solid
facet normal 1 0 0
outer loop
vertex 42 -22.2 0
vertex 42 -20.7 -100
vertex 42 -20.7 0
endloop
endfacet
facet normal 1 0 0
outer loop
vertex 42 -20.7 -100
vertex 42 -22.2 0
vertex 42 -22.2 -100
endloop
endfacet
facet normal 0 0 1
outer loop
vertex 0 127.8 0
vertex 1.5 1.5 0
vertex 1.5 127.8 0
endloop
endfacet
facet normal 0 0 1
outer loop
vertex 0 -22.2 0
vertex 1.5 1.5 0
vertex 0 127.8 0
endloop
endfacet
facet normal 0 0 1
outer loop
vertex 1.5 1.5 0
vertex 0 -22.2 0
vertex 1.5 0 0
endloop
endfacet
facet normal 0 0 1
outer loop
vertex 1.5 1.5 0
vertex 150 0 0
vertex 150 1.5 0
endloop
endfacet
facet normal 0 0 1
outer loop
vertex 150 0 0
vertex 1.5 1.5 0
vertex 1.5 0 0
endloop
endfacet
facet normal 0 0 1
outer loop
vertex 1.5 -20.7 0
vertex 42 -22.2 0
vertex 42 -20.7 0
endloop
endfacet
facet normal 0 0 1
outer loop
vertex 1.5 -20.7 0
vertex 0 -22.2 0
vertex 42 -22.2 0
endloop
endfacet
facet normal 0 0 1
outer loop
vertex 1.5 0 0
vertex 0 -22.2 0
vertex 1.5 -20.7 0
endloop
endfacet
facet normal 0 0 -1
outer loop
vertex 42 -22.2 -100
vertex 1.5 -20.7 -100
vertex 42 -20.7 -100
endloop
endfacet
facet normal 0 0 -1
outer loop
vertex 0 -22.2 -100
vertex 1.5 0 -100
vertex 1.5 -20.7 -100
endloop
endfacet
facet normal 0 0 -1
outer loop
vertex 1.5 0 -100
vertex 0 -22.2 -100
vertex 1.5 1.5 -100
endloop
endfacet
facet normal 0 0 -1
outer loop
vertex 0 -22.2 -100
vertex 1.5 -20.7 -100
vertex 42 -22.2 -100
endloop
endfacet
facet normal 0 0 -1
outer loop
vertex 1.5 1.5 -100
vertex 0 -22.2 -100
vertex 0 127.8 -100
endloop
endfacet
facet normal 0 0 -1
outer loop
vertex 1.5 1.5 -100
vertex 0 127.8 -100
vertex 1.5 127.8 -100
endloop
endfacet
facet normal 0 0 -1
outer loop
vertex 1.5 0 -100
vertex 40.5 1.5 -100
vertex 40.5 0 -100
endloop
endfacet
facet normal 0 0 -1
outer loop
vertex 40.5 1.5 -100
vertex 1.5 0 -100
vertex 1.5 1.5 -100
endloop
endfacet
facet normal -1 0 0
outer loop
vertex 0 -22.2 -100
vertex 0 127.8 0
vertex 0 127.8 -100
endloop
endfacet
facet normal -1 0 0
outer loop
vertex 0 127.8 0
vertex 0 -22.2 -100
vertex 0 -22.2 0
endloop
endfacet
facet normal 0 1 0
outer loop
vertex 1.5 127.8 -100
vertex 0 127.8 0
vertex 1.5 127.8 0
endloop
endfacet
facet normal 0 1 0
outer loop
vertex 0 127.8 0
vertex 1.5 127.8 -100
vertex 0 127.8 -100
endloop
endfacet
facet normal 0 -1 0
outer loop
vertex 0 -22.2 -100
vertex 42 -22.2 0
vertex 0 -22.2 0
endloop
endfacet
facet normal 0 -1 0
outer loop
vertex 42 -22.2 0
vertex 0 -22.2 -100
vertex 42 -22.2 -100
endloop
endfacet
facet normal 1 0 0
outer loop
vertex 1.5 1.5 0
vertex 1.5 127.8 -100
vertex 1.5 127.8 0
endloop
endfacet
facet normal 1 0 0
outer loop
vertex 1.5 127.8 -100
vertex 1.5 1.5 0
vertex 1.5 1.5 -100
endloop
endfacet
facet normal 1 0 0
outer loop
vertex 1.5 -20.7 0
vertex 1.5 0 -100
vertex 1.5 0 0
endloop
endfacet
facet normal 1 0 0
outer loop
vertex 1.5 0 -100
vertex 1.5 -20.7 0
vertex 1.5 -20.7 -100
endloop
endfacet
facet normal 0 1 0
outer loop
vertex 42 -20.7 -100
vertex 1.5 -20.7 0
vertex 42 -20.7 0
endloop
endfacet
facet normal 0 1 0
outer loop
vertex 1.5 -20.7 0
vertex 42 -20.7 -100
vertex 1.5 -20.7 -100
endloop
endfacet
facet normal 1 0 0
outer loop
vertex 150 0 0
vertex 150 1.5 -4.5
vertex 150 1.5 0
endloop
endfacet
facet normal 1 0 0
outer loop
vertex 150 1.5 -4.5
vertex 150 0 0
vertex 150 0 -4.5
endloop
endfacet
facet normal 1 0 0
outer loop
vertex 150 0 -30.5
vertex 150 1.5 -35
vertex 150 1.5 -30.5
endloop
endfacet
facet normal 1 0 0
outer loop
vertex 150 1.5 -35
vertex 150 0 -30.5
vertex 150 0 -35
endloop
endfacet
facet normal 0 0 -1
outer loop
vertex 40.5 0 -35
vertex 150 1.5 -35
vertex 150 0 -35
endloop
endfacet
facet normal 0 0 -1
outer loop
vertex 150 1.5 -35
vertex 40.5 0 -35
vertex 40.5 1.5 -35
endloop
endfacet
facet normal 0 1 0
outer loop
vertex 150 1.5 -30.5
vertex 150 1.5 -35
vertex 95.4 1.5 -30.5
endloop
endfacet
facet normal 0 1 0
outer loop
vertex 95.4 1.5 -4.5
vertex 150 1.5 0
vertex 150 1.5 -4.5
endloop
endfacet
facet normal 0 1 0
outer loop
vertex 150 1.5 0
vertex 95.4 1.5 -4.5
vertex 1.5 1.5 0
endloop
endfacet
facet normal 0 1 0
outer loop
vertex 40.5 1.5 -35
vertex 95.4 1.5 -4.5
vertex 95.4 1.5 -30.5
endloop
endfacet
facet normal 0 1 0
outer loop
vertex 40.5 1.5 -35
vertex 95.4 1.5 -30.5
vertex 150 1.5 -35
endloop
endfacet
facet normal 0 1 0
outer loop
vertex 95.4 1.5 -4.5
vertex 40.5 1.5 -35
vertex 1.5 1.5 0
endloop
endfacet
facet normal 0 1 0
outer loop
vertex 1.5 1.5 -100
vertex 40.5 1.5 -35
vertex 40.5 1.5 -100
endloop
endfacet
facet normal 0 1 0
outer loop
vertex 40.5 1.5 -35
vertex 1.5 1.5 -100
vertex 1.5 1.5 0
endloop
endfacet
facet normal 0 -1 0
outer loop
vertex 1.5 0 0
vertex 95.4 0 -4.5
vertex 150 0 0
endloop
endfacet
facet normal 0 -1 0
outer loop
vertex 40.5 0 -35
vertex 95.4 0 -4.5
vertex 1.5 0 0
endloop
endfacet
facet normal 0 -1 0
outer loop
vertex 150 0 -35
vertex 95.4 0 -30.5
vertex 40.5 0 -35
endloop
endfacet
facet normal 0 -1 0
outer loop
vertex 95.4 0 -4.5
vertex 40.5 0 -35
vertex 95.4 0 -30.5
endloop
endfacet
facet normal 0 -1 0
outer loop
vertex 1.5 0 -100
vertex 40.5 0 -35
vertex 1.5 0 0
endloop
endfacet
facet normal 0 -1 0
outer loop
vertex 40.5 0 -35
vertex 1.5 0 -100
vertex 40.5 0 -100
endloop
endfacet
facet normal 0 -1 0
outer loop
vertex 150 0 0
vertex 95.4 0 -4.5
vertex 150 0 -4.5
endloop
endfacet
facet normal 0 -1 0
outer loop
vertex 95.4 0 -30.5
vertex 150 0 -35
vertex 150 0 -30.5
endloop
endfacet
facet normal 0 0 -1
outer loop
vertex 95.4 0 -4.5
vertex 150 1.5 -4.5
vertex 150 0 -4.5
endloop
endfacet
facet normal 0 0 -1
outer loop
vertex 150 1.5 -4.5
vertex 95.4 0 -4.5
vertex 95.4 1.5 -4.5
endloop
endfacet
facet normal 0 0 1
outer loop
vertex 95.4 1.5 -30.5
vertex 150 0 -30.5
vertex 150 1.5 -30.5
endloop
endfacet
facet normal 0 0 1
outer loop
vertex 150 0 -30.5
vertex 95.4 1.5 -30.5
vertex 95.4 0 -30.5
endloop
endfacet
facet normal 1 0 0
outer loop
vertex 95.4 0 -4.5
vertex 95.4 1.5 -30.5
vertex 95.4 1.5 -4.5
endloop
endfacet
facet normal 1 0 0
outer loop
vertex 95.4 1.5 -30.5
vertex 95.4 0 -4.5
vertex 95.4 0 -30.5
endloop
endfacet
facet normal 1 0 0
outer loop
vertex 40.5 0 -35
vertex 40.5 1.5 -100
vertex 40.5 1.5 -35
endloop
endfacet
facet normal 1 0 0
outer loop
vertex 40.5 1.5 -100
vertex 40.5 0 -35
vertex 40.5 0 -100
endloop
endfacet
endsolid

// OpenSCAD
use <MCAD/regular_shapes.scad>


t = 1.5;
p_w = 74.2;
eps = 1;

b_w = 20.7;
b_h = 40.5;

bed_to_skirting = 150;
extension_w = 26;
bed_to_skirting_w = extension_w + 6*t;
extension_h = 54.6;

table_w = 100;
table_l = 150;

translate([0, - b_w - t, -table_w])
difference(){
    cube([b_h + t, table_l, table_w]);
    translate([t, t, 0])
    cube([b_h, table_l-t, table_w]);
}

translate([0, 0, -table_w])
cube([b_h, t, table_w]);

difference(){
    translate([0, 0, -bed_to_skirting_w])
    cube([bed_to_skirting, t, bed_to_skirting_w]);
    
    translate([bed_to_skirting - extension_h, 0, (extension_w-bed_to_skirting_w)/2 - extension_w])
    cube([extension_h, t, extension_w]);
}
